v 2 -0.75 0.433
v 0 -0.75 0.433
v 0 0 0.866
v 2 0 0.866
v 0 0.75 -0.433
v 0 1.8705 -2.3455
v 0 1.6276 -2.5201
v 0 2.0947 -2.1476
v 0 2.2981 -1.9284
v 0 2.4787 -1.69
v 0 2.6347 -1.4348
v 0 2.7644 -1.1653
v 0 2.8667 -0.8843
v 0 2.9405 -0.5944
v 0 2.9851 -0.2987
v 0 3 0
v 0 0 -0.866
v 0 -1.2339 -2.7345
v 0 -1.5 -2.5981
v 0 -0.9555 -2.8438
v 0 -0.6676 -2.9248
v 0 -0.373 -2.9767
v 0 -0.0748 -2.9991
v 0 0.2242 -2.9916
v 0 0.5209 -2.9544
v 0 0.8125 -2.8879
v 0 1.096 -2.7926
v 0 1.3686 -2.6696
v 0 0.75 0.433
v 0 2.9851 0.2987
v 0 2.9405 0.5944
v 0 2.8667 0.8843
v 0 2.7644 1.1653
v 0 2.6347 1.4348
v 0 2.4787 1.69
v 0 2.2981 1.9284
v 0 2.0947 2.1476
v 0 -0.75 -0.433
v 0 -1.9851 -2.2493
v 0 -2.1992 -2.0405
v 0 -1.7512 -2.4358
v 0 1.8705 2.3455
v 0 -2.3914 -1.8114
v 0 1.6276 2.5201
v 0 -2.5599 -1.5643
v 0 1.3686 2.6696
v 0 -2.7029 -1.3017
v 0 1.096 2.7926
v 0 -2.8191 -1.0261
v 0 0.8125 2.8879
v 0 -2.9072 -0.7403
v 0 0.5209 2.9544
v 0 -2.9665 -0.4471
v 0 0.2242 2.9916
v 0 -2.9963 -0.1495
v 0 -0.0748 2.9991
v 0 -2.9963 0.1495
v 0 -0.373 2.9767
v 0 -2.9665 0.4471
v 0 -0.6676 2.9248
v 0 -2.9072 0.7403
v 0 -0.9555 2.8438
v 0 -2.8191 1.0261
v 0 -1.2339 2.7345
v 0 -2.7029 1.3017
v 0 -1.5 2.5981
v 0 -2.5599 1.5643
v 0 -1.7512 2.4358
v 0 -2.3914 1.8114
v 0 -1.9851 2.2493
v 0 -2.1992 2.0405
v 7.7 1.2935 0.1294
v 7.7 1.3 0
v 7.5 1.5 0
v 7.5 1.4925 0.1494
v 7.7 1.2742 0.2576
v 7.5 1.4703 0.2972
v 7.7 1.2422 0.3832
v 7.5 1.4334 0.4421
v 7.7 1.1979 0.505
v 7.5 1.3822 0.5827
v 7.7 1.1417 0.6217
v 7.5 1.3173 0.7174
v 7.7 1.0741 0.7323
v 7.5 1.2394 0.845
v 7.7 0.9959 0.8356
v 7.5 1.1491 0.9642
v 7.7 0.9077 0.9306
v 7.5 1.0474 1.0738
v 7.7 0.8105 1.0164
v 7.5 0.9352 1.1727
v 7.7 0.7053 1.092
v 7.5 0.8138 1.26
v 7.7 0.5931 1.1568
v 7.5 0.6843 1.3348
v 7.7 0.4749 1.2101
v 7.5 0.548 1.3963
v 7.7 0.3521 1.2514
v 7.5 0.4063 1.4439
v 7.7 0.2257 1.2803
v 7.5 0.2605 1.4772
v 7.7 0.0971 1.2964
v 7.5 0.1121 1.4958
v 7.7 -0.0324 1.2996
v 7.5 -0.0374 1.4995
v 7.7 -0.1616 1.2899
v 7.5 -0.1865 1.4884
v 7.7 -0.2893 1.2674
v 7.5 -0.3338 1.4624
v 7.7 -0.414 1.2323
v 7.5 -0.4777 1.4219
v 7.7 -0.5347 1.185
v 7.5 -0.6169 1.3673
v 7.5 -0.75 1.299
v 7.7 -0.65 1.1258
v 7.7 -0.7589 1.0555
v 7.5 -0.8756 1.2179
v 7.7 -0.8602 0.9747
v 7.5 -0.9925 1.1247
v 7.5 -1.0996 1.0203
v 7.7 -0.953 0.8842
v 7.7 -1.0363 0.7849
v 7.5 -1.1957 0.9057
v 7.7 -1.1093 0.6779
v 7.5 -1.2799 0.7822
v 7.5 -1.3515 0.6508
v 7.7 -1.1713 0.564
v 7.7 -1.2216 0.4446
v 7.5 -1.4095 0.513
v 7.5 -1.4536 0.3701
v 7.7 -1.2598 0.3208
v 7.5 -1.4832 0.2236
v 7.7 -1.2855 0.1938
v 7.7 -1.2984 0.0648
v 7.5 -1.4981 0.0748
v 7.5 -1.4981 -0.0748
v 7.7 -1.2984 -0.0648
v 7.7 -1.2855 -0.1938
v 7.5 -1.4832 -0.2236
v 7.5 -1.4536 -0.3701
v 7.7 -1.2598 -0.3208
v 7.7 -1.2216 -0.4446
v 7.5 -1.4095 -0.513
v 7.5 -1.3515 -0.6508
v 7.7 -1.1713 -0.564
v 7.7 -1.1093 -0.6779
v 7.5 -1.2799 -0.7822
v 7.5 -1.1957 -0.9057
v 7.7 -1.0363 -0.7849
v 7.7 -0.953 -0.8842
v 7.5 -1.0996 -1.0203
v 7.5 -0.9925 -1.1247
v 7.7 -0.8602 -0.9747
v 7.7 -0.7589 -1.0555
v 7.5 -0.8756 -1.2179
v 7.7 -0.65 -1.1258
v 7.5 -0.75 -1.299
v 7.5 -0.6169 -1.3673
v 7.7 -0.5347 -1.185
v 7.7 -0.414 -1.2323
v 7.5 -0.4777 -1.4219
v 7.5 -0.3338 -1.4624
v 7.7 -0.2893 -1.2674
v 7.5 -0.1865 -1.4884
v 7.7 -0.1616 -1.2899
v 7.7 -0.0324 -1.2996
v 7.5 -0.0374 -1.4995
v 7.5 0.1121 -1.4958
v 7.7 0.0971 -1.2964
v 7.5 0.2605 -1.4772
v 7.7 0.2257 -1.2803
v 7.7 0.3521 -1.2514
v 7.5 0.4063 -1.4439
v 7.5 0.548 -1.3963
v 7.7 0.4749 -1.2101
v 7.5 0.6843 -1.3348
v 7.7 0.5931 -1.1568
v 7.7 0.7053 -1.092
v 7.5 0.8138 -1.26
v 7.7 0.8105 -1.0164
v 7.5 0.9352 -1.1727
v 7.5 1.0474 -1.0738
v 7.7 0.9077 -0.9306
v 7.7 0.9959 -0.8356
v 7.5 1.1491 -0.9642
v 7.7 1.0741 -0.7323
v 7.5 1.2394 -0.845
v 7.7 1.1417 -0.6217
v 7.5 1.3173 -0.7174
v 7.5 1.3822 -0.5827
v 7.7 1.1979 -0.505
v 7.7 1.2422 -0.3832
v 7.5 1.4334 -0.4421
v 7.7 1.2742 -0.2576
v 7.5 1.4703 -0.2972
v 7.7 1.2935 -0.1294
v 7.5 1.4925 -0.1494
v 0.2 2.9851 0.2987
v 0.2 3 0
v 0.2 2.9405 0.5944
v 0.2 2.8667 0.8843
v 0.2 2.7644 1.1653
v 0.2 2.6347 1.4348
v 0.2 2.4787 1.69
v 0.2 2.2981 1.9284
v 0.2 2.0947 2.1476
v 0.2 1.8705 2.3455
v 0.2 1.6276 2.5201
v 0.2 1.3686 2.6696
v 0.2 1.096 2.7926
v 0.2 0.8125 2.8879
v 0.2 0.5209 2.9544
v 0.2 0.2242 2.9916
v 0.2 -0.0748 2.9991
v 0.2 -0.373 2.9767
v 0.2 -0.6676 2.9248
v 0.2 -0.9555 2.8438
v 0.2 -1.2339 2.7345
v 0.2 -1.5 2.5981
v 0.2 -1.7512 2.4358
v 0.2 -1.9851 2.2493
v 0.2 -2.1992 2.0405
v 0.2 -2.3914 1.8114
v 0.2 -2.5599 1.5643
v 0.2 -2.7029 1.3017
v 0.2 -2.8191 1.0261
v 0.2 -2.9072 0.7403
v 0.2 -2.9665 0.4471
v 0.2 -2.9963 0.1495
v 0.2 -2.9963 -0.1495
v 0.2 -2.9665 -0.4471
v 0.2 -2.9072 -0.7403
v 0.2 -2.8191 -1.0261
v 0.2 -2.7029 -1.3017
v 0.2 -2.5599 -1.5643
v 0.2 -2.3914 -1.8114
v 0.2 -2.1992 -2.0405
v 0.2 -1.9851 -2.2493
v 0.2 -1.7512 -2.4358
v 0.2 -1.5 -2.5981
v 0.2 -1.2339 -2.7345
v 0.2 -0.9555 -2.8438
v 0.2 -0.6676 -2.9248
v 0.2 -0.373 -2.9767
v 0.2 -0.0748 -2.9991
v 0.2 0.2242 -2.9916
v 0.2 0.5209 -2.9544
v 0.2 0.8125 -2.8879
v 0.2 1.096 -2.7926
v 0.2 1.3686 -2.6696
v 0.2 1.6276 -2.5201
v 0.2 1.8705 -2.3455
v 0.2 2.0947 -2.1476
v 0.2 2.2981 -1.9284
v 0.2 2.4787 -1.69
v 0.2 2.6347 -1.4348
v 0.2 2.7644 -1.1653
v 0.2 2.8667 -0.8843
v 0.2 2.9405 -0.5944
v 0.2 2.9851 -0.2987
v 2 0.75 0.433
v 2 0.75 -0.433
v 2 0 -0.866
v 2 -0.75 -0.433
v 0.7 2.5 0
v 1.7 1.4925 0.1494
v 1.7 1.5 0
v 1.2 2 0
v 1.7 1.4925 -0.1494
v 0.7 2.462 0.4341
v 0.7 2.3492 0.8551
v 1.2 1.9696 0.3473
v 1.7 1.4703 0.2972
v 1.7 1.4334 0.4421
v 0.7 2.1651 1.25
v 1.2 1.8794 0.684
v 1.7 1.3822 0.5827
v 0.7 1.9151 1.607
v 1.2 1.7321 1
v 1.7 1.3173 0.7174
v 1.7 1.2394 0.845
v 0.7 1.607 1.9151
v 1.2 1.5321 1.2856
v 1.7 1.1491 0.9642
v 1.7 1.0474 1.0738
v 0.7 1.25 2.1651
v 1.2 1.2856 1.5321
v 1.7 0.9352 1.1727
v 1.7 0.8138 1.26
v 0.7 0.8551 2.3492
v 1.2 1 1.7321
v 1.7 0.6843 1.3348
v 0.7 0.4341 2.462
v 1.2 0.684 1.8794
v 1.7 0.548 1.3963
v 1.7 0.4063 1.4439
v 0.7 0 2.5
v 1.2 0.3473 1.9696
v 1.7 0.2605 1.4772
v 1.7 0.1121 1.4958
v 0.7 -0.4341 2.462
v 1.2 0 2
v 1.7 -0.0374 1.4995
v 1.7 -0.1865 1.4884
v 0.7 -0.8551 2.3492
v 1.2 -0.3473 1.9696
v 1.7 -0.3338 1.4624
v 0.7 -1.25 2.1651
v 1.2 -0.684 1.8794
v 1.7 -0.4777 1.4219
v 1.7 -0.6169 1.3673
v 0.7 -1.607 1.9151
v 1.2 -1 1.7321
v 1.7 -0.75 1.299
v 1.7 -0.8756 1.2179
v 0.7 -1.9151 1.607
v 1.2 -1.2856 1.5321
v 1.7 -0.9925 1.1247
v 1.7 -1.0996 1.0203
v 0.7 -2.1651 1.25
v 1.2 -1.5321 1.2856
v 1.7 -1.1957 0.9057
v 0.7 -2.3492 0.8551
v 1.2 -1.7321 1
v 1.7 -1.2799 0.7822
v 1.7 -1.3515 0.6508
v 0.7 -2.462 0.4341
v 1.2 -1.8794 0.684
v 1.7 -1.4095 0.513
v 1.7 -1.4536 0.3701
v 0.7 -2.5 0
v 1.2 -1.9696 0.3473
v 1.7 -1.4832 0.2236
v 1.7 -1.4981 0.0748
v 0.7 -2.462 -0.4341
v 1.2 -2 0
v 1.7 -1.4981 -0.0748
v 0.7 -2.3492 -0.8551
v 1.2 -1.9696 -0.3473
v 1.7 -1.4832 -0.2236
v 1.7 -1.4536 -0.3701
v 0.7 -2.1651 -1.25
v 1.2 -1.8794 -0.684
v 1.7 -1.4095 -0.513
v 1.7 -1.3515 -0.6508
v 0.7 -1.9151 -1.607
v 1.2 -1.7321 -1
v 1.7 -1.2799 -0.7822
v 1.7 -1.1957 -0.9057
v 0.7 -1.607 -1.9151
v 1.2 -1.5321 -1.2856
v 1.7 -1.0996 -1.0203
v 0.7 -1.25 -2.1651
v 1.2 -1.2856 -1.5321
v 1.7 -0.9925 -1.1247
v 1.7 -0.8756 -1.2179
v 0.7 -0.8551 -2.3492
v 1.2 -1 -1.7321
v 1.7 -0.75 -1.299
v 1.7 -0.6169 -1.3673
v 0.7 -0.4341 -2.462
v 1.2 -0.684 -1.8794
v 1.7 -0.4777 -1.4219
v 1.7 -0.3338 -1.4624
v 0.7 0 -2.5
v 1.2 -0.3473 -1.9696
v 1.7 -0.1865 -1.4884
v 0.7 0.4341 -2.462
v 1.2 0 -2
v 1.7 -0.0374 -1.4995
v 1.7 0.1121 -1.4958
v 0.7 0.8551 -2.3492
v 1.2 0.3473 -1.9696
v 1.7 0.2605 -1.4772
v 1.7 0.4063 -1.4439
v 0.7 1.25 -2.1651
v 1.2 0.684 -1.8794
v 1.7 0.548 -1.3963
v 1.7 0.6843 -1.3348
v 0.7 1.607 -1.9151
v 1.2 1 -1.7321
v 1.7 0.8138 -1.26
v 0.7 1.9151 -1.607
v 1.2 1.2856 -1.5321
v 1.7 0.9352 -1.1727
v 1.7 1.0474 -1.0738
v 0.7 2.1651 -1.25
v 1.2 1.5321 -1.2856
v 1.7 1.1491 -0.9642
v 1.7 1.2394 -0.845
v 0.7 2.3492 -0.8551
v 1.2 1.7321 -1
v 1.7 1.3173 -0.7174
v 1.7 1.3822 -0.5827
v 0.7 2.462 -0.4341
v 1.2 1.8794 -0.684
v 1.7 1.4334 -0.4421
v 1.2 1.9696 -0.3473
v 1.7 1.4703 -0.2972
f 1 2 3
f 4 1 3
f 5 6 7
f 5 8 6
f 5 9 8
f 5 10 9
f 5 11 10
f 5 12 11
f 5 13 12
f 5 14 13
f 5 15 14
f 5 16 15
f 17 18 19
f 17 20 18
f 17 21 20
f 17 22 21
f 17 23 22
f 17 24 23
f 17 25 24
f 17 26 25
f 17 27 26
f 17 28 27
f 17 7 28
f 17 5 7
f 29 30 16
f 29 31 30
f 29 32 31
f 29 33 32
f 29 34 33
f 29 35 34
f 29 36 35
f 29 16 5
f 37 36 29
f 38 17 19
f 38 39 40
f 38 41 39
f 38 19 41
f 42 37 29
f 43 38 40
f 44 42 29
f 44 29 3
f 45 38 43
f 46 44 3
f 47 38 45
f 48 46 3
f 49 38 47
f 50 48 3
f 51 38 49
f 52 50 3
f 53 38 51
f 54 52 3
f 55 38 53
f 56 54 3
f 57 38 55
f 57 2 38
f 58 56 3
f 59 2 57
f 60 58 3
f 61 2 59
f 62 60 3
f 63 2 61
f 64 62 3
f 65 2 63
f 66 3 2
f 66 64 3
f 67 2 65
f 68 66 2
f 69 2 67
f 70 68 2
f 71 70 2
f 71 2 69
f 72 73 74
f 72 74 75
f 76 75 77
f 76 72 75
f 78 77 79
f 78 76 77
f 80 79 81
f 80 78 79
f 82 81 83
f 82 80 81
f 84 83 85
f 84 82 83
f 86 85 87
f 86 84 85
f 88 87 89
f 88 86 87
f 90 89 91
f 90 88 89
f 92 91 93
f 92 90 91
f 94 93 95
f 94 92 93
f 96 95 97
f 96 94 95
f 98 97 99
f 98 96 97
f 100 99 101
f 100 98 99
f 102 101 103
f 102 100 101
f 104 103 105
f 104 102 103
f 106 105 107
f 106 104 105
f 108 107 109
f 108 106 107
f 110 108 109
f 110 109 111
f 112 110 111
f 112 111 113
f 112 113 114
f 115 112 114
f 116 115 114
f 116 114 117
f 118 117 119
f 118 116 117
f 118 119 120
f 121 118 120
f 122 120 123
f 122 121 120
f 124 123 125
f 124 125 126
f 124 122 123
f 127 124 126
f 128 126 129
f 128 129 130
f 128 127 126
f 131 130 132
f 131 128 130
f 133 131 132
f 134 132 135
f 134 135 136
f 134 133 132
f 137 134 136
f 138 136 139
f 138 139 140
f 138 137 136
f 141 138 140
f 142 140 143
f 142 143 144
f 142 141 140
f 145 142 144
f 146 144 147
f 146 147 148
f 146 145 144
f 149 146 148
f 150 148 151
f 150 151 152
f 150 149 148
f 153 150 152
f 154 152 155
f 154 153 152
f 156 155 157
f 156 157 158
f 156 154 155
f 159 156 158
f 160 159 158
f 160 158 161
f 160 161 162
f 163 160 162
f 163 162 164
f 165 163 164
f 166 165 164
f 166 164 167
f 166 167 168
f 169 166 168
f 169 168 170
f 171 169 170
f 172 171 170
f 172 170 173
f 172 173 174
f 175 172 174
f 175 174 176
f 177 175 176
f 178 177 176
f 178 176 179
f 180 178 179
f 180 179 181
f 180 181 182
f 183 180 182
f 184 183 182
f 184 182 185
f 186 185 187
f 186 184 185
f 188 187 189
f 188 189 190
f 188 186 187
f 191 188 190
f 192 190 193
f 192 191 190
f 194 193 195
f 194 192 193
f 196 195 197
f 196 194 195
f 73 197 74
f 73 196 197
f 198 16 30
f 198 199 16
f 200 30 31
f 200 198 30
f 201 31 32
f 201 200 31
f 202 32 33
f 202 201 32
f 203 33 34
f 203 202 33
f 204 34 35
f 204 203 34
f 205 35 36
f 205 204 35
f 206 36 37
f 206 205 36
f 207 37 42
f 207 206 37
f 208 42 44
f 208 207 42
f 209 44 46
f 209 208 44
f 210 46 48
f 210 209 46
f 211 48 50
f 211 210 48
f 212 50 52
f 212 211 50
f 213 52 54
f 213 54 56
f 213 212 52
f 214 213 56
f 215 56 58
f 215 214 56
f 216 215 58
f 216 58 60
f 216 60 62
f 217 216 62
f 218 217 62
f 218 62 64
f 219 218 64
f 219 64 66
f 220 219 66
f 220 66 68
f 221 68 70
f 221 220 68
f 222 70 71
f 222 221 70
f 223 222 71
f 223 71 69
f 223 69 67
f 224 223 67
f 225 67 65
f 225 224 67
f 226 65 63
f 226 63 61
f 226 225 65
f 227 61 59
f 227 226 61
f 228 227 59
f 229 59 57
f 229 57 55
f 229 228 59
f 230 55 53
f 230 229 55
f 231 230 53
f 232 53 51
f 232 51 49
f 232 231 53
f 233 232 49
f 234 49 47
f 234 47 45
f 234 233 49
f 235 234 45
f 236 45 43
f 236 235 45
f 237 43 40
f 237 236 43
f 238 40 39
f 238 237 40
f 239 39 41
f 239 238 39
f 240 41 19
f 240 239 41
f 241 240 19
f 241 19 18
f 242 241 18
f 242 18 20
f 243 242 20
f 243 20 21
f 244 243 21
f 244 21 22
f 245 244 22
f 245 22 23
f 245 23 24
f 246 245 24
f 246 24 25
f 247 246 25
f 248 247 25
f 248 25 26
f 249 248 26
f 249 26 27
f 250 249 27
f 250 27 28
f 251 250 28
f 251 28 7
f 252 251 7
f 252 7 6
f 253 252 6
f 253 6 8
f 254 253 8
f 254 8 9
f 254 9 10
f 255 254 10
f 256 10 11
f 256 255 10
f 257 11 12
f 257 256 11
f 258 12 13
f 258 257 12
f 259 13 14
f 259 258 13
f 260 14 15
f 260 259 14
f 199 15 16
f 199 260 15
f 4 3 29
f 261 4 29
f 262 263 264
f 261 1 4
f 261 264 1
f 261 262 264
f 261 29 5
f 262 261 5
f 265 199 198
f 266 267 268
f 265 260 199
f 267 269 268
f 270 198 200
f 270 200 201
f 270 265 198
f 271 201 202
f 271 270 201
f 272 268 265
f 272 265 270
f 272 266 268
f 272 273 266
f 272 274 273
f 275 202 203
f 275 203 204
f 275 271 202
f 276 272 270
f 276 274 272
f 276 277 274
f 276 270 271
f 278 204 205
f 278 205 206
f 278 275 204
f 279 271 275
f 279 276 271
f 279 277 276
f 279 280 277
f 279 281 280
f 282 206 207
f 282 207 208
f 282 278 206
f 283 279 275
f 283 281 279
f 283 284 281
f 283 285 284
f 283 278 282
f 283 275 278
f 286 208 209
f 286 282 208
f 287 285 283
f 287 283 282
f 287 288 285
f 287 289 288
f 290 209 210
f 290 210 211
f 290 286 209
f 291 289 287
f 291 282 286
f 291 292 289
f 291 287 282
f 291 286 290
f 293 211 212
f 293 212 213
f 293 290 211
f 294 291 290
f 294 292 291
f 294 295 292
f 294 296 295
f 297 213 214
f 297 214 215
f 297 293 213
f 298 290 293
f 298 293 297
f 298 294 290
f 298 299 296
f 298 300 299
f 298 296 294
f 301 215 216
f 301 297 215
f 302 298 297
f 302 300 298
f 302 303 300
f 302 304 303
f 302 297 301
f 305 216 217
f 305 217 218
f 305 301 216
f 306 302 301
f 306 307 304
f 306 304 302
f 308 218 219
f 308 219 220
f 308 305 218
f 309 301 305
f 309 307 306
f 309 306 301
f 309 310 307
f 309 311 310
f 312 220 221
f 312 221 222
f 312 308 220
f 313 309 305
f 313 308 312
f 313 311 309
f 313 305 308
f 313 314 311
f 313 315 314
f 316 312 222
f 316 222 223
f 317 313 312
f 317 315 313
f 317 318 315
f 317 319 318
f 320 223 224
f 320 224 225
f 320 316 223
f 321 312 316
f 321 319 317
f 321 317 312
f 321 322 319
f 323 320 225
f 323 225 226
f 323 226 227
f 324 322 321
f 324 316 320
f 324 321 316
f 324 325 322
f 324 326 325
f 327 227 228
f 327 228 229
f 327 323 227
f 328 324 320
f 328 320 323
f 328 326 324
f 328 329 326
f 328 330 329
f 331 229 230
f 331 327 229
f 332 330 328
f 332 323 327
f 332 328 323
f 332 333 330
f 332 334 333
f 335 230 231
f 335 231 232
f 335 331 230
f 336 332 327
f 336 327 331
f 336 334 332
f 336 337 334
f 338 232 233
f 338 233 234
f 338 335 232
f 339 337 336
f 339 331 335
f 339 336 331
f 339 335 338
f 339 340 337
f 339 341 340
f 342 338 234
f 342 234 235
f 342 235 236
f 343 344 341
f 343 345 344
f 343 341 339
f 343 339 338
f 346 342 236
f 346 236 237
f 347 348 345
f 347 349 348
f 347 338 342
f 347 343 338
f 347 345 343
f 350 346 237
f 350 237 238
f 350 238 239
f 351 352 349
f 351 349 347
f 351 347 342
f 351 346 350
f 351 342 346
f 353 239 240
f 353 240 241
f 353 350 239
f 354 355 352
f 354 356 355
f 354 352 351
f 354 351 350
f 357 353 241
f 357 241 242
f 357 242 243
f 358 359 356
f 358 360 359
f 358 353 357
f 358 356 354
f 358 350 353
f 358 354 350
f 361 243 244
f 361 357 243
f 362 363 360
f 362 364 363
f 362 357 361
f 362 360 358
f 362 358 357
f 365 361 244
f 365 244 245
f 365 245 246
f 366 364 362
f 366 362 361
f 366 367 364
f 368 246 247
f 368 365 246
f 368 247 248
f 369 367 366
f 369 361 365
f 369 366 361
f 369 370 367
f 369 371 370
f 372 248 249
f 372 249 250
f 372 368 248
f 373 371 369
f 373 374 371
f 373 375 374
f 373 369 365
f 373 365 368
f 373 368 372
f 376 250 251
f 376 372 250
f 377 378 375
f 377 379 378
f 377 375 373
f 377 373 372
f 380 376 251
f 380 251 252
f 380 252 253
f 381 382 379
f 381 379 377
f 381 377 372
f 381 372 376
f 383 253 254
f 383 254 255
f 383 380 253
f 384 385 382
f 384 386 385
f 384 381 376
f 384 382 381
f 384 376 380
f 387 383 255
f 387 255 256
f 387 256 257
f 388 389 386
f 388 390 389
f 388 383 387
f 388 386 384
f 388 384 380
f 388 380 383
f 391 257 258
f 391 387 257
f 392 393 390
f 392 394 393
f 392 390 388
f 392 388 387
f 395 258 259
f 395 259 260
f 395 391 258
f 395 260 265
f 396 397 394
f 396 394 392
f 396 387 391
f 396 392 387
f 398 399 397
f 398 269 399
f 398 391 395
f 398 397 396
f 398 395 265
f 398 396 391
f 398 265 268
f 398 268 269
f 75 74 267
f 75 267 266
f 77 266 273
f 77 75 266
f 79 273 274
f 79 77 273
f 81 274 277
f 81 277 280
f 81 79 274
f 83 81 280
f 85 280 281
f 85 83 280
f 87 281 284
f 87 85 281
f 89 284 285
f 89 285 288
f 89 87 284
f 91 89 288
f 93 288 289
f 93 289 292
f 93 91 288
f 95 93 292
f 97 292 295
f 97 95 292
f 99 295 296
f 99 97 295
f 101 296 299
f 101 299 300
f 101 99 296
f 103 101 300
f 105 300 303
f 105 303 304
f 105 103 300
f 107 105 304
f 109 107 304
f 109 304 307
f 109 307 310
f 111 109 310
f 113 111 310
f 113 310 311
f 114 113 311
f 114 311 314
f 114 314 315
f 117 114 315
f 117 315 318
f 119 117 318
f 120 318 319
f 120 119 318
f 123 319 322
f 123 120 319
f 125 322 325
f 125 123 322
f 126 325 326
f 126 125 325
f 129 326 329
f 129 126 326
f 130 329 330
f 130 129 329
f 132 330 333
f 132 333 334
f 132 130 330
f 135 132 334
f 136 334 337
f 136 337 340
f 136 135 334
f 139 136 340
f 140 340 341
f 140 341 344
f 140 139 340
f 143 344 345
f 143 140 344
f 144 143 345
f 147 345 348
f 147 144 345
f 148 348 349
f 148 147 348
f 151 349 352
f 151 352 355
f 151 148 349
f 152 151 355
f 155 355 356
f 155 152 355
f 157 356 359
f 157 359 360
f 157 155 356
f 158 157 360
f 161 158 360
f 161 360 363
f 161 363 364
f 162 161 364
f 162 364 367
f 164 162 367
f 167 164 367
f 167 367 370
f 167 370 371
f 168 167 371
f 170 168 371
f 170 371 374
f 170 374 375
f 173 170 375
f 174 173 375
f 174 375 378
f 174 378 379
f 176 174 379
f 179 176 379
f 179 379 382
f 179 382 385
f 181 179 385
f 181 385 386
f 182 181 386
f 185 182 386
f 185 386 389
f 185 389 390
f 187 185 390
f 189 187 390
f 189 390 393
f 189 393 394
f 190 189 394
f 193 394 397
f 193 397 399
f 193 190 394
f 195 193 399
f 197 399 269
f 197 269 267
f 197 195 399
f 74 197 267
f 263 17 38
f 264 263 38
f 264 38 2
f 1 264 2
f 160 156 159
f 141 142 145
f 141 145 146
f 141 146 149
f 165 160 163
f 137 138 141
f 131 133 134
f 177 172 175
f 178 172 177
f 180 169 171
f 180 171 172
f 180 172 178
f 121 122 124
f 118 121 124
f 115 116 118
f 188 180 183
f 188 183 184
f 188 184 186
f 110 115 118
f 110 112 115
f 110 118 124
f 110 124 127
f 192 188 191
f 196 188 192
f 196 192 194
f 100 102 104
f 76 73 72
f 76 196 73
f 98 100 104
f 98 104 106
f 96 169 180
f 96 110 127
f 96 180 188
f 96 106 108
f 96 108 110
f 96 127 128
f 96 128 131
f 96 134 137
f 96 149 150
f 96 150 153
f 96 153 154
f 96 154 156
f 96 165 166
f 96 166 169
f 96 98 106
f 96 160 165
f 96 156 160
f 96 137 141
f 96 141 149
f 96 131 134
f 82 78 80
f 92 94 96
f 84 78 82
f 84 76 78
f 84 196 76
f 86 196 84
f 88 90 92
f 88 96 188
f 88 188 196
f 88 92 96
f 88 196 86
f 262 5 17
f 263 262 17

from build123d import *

# Parameters (mm, degrees)
ENL_V_MAT_EXTRU_1_DEPTH = 2
CHANFREIN1_SIZE         = 0.2


with BuildPart() as part:
    # Esquisse1 → Révolution1 (revolve)
    with BuildSketch(Plane.XY):
        Polygon((0, 0), (0, 3), (0.2, 3), (1.7, 1.5), (7.7, 1.5), (7.7, 0), align=None)
    revolve(axis=Axis((0, 0, 0), (1, 0, 0)))

    # Esquisse2 → Enlèv. mat.-Extru.1 (cut)
    with BuildSketch(Plane.ZY):
        Polygon((0.433012702, -0.75), (0.866025404, 0), (0.433012702, 0.75), (-0.433012702, 0.75), (-0.866025404, 0), (-0.433012702, -0.75), align=None)
    extrude(amount=-ENL_V_MAT_EXTRU_1_DEPTH, mode=Mode.SUBTRACT)

    # Chanfrein1
    chanfrein1_edges = [part.edges().sort_by_distance(p)[0] for p in [
        (7.7, -1.5, 0),
    ]]
    chamfer(chanfrein1_edges, length=CHANFREIN1_SIZE)


solid = part.part
